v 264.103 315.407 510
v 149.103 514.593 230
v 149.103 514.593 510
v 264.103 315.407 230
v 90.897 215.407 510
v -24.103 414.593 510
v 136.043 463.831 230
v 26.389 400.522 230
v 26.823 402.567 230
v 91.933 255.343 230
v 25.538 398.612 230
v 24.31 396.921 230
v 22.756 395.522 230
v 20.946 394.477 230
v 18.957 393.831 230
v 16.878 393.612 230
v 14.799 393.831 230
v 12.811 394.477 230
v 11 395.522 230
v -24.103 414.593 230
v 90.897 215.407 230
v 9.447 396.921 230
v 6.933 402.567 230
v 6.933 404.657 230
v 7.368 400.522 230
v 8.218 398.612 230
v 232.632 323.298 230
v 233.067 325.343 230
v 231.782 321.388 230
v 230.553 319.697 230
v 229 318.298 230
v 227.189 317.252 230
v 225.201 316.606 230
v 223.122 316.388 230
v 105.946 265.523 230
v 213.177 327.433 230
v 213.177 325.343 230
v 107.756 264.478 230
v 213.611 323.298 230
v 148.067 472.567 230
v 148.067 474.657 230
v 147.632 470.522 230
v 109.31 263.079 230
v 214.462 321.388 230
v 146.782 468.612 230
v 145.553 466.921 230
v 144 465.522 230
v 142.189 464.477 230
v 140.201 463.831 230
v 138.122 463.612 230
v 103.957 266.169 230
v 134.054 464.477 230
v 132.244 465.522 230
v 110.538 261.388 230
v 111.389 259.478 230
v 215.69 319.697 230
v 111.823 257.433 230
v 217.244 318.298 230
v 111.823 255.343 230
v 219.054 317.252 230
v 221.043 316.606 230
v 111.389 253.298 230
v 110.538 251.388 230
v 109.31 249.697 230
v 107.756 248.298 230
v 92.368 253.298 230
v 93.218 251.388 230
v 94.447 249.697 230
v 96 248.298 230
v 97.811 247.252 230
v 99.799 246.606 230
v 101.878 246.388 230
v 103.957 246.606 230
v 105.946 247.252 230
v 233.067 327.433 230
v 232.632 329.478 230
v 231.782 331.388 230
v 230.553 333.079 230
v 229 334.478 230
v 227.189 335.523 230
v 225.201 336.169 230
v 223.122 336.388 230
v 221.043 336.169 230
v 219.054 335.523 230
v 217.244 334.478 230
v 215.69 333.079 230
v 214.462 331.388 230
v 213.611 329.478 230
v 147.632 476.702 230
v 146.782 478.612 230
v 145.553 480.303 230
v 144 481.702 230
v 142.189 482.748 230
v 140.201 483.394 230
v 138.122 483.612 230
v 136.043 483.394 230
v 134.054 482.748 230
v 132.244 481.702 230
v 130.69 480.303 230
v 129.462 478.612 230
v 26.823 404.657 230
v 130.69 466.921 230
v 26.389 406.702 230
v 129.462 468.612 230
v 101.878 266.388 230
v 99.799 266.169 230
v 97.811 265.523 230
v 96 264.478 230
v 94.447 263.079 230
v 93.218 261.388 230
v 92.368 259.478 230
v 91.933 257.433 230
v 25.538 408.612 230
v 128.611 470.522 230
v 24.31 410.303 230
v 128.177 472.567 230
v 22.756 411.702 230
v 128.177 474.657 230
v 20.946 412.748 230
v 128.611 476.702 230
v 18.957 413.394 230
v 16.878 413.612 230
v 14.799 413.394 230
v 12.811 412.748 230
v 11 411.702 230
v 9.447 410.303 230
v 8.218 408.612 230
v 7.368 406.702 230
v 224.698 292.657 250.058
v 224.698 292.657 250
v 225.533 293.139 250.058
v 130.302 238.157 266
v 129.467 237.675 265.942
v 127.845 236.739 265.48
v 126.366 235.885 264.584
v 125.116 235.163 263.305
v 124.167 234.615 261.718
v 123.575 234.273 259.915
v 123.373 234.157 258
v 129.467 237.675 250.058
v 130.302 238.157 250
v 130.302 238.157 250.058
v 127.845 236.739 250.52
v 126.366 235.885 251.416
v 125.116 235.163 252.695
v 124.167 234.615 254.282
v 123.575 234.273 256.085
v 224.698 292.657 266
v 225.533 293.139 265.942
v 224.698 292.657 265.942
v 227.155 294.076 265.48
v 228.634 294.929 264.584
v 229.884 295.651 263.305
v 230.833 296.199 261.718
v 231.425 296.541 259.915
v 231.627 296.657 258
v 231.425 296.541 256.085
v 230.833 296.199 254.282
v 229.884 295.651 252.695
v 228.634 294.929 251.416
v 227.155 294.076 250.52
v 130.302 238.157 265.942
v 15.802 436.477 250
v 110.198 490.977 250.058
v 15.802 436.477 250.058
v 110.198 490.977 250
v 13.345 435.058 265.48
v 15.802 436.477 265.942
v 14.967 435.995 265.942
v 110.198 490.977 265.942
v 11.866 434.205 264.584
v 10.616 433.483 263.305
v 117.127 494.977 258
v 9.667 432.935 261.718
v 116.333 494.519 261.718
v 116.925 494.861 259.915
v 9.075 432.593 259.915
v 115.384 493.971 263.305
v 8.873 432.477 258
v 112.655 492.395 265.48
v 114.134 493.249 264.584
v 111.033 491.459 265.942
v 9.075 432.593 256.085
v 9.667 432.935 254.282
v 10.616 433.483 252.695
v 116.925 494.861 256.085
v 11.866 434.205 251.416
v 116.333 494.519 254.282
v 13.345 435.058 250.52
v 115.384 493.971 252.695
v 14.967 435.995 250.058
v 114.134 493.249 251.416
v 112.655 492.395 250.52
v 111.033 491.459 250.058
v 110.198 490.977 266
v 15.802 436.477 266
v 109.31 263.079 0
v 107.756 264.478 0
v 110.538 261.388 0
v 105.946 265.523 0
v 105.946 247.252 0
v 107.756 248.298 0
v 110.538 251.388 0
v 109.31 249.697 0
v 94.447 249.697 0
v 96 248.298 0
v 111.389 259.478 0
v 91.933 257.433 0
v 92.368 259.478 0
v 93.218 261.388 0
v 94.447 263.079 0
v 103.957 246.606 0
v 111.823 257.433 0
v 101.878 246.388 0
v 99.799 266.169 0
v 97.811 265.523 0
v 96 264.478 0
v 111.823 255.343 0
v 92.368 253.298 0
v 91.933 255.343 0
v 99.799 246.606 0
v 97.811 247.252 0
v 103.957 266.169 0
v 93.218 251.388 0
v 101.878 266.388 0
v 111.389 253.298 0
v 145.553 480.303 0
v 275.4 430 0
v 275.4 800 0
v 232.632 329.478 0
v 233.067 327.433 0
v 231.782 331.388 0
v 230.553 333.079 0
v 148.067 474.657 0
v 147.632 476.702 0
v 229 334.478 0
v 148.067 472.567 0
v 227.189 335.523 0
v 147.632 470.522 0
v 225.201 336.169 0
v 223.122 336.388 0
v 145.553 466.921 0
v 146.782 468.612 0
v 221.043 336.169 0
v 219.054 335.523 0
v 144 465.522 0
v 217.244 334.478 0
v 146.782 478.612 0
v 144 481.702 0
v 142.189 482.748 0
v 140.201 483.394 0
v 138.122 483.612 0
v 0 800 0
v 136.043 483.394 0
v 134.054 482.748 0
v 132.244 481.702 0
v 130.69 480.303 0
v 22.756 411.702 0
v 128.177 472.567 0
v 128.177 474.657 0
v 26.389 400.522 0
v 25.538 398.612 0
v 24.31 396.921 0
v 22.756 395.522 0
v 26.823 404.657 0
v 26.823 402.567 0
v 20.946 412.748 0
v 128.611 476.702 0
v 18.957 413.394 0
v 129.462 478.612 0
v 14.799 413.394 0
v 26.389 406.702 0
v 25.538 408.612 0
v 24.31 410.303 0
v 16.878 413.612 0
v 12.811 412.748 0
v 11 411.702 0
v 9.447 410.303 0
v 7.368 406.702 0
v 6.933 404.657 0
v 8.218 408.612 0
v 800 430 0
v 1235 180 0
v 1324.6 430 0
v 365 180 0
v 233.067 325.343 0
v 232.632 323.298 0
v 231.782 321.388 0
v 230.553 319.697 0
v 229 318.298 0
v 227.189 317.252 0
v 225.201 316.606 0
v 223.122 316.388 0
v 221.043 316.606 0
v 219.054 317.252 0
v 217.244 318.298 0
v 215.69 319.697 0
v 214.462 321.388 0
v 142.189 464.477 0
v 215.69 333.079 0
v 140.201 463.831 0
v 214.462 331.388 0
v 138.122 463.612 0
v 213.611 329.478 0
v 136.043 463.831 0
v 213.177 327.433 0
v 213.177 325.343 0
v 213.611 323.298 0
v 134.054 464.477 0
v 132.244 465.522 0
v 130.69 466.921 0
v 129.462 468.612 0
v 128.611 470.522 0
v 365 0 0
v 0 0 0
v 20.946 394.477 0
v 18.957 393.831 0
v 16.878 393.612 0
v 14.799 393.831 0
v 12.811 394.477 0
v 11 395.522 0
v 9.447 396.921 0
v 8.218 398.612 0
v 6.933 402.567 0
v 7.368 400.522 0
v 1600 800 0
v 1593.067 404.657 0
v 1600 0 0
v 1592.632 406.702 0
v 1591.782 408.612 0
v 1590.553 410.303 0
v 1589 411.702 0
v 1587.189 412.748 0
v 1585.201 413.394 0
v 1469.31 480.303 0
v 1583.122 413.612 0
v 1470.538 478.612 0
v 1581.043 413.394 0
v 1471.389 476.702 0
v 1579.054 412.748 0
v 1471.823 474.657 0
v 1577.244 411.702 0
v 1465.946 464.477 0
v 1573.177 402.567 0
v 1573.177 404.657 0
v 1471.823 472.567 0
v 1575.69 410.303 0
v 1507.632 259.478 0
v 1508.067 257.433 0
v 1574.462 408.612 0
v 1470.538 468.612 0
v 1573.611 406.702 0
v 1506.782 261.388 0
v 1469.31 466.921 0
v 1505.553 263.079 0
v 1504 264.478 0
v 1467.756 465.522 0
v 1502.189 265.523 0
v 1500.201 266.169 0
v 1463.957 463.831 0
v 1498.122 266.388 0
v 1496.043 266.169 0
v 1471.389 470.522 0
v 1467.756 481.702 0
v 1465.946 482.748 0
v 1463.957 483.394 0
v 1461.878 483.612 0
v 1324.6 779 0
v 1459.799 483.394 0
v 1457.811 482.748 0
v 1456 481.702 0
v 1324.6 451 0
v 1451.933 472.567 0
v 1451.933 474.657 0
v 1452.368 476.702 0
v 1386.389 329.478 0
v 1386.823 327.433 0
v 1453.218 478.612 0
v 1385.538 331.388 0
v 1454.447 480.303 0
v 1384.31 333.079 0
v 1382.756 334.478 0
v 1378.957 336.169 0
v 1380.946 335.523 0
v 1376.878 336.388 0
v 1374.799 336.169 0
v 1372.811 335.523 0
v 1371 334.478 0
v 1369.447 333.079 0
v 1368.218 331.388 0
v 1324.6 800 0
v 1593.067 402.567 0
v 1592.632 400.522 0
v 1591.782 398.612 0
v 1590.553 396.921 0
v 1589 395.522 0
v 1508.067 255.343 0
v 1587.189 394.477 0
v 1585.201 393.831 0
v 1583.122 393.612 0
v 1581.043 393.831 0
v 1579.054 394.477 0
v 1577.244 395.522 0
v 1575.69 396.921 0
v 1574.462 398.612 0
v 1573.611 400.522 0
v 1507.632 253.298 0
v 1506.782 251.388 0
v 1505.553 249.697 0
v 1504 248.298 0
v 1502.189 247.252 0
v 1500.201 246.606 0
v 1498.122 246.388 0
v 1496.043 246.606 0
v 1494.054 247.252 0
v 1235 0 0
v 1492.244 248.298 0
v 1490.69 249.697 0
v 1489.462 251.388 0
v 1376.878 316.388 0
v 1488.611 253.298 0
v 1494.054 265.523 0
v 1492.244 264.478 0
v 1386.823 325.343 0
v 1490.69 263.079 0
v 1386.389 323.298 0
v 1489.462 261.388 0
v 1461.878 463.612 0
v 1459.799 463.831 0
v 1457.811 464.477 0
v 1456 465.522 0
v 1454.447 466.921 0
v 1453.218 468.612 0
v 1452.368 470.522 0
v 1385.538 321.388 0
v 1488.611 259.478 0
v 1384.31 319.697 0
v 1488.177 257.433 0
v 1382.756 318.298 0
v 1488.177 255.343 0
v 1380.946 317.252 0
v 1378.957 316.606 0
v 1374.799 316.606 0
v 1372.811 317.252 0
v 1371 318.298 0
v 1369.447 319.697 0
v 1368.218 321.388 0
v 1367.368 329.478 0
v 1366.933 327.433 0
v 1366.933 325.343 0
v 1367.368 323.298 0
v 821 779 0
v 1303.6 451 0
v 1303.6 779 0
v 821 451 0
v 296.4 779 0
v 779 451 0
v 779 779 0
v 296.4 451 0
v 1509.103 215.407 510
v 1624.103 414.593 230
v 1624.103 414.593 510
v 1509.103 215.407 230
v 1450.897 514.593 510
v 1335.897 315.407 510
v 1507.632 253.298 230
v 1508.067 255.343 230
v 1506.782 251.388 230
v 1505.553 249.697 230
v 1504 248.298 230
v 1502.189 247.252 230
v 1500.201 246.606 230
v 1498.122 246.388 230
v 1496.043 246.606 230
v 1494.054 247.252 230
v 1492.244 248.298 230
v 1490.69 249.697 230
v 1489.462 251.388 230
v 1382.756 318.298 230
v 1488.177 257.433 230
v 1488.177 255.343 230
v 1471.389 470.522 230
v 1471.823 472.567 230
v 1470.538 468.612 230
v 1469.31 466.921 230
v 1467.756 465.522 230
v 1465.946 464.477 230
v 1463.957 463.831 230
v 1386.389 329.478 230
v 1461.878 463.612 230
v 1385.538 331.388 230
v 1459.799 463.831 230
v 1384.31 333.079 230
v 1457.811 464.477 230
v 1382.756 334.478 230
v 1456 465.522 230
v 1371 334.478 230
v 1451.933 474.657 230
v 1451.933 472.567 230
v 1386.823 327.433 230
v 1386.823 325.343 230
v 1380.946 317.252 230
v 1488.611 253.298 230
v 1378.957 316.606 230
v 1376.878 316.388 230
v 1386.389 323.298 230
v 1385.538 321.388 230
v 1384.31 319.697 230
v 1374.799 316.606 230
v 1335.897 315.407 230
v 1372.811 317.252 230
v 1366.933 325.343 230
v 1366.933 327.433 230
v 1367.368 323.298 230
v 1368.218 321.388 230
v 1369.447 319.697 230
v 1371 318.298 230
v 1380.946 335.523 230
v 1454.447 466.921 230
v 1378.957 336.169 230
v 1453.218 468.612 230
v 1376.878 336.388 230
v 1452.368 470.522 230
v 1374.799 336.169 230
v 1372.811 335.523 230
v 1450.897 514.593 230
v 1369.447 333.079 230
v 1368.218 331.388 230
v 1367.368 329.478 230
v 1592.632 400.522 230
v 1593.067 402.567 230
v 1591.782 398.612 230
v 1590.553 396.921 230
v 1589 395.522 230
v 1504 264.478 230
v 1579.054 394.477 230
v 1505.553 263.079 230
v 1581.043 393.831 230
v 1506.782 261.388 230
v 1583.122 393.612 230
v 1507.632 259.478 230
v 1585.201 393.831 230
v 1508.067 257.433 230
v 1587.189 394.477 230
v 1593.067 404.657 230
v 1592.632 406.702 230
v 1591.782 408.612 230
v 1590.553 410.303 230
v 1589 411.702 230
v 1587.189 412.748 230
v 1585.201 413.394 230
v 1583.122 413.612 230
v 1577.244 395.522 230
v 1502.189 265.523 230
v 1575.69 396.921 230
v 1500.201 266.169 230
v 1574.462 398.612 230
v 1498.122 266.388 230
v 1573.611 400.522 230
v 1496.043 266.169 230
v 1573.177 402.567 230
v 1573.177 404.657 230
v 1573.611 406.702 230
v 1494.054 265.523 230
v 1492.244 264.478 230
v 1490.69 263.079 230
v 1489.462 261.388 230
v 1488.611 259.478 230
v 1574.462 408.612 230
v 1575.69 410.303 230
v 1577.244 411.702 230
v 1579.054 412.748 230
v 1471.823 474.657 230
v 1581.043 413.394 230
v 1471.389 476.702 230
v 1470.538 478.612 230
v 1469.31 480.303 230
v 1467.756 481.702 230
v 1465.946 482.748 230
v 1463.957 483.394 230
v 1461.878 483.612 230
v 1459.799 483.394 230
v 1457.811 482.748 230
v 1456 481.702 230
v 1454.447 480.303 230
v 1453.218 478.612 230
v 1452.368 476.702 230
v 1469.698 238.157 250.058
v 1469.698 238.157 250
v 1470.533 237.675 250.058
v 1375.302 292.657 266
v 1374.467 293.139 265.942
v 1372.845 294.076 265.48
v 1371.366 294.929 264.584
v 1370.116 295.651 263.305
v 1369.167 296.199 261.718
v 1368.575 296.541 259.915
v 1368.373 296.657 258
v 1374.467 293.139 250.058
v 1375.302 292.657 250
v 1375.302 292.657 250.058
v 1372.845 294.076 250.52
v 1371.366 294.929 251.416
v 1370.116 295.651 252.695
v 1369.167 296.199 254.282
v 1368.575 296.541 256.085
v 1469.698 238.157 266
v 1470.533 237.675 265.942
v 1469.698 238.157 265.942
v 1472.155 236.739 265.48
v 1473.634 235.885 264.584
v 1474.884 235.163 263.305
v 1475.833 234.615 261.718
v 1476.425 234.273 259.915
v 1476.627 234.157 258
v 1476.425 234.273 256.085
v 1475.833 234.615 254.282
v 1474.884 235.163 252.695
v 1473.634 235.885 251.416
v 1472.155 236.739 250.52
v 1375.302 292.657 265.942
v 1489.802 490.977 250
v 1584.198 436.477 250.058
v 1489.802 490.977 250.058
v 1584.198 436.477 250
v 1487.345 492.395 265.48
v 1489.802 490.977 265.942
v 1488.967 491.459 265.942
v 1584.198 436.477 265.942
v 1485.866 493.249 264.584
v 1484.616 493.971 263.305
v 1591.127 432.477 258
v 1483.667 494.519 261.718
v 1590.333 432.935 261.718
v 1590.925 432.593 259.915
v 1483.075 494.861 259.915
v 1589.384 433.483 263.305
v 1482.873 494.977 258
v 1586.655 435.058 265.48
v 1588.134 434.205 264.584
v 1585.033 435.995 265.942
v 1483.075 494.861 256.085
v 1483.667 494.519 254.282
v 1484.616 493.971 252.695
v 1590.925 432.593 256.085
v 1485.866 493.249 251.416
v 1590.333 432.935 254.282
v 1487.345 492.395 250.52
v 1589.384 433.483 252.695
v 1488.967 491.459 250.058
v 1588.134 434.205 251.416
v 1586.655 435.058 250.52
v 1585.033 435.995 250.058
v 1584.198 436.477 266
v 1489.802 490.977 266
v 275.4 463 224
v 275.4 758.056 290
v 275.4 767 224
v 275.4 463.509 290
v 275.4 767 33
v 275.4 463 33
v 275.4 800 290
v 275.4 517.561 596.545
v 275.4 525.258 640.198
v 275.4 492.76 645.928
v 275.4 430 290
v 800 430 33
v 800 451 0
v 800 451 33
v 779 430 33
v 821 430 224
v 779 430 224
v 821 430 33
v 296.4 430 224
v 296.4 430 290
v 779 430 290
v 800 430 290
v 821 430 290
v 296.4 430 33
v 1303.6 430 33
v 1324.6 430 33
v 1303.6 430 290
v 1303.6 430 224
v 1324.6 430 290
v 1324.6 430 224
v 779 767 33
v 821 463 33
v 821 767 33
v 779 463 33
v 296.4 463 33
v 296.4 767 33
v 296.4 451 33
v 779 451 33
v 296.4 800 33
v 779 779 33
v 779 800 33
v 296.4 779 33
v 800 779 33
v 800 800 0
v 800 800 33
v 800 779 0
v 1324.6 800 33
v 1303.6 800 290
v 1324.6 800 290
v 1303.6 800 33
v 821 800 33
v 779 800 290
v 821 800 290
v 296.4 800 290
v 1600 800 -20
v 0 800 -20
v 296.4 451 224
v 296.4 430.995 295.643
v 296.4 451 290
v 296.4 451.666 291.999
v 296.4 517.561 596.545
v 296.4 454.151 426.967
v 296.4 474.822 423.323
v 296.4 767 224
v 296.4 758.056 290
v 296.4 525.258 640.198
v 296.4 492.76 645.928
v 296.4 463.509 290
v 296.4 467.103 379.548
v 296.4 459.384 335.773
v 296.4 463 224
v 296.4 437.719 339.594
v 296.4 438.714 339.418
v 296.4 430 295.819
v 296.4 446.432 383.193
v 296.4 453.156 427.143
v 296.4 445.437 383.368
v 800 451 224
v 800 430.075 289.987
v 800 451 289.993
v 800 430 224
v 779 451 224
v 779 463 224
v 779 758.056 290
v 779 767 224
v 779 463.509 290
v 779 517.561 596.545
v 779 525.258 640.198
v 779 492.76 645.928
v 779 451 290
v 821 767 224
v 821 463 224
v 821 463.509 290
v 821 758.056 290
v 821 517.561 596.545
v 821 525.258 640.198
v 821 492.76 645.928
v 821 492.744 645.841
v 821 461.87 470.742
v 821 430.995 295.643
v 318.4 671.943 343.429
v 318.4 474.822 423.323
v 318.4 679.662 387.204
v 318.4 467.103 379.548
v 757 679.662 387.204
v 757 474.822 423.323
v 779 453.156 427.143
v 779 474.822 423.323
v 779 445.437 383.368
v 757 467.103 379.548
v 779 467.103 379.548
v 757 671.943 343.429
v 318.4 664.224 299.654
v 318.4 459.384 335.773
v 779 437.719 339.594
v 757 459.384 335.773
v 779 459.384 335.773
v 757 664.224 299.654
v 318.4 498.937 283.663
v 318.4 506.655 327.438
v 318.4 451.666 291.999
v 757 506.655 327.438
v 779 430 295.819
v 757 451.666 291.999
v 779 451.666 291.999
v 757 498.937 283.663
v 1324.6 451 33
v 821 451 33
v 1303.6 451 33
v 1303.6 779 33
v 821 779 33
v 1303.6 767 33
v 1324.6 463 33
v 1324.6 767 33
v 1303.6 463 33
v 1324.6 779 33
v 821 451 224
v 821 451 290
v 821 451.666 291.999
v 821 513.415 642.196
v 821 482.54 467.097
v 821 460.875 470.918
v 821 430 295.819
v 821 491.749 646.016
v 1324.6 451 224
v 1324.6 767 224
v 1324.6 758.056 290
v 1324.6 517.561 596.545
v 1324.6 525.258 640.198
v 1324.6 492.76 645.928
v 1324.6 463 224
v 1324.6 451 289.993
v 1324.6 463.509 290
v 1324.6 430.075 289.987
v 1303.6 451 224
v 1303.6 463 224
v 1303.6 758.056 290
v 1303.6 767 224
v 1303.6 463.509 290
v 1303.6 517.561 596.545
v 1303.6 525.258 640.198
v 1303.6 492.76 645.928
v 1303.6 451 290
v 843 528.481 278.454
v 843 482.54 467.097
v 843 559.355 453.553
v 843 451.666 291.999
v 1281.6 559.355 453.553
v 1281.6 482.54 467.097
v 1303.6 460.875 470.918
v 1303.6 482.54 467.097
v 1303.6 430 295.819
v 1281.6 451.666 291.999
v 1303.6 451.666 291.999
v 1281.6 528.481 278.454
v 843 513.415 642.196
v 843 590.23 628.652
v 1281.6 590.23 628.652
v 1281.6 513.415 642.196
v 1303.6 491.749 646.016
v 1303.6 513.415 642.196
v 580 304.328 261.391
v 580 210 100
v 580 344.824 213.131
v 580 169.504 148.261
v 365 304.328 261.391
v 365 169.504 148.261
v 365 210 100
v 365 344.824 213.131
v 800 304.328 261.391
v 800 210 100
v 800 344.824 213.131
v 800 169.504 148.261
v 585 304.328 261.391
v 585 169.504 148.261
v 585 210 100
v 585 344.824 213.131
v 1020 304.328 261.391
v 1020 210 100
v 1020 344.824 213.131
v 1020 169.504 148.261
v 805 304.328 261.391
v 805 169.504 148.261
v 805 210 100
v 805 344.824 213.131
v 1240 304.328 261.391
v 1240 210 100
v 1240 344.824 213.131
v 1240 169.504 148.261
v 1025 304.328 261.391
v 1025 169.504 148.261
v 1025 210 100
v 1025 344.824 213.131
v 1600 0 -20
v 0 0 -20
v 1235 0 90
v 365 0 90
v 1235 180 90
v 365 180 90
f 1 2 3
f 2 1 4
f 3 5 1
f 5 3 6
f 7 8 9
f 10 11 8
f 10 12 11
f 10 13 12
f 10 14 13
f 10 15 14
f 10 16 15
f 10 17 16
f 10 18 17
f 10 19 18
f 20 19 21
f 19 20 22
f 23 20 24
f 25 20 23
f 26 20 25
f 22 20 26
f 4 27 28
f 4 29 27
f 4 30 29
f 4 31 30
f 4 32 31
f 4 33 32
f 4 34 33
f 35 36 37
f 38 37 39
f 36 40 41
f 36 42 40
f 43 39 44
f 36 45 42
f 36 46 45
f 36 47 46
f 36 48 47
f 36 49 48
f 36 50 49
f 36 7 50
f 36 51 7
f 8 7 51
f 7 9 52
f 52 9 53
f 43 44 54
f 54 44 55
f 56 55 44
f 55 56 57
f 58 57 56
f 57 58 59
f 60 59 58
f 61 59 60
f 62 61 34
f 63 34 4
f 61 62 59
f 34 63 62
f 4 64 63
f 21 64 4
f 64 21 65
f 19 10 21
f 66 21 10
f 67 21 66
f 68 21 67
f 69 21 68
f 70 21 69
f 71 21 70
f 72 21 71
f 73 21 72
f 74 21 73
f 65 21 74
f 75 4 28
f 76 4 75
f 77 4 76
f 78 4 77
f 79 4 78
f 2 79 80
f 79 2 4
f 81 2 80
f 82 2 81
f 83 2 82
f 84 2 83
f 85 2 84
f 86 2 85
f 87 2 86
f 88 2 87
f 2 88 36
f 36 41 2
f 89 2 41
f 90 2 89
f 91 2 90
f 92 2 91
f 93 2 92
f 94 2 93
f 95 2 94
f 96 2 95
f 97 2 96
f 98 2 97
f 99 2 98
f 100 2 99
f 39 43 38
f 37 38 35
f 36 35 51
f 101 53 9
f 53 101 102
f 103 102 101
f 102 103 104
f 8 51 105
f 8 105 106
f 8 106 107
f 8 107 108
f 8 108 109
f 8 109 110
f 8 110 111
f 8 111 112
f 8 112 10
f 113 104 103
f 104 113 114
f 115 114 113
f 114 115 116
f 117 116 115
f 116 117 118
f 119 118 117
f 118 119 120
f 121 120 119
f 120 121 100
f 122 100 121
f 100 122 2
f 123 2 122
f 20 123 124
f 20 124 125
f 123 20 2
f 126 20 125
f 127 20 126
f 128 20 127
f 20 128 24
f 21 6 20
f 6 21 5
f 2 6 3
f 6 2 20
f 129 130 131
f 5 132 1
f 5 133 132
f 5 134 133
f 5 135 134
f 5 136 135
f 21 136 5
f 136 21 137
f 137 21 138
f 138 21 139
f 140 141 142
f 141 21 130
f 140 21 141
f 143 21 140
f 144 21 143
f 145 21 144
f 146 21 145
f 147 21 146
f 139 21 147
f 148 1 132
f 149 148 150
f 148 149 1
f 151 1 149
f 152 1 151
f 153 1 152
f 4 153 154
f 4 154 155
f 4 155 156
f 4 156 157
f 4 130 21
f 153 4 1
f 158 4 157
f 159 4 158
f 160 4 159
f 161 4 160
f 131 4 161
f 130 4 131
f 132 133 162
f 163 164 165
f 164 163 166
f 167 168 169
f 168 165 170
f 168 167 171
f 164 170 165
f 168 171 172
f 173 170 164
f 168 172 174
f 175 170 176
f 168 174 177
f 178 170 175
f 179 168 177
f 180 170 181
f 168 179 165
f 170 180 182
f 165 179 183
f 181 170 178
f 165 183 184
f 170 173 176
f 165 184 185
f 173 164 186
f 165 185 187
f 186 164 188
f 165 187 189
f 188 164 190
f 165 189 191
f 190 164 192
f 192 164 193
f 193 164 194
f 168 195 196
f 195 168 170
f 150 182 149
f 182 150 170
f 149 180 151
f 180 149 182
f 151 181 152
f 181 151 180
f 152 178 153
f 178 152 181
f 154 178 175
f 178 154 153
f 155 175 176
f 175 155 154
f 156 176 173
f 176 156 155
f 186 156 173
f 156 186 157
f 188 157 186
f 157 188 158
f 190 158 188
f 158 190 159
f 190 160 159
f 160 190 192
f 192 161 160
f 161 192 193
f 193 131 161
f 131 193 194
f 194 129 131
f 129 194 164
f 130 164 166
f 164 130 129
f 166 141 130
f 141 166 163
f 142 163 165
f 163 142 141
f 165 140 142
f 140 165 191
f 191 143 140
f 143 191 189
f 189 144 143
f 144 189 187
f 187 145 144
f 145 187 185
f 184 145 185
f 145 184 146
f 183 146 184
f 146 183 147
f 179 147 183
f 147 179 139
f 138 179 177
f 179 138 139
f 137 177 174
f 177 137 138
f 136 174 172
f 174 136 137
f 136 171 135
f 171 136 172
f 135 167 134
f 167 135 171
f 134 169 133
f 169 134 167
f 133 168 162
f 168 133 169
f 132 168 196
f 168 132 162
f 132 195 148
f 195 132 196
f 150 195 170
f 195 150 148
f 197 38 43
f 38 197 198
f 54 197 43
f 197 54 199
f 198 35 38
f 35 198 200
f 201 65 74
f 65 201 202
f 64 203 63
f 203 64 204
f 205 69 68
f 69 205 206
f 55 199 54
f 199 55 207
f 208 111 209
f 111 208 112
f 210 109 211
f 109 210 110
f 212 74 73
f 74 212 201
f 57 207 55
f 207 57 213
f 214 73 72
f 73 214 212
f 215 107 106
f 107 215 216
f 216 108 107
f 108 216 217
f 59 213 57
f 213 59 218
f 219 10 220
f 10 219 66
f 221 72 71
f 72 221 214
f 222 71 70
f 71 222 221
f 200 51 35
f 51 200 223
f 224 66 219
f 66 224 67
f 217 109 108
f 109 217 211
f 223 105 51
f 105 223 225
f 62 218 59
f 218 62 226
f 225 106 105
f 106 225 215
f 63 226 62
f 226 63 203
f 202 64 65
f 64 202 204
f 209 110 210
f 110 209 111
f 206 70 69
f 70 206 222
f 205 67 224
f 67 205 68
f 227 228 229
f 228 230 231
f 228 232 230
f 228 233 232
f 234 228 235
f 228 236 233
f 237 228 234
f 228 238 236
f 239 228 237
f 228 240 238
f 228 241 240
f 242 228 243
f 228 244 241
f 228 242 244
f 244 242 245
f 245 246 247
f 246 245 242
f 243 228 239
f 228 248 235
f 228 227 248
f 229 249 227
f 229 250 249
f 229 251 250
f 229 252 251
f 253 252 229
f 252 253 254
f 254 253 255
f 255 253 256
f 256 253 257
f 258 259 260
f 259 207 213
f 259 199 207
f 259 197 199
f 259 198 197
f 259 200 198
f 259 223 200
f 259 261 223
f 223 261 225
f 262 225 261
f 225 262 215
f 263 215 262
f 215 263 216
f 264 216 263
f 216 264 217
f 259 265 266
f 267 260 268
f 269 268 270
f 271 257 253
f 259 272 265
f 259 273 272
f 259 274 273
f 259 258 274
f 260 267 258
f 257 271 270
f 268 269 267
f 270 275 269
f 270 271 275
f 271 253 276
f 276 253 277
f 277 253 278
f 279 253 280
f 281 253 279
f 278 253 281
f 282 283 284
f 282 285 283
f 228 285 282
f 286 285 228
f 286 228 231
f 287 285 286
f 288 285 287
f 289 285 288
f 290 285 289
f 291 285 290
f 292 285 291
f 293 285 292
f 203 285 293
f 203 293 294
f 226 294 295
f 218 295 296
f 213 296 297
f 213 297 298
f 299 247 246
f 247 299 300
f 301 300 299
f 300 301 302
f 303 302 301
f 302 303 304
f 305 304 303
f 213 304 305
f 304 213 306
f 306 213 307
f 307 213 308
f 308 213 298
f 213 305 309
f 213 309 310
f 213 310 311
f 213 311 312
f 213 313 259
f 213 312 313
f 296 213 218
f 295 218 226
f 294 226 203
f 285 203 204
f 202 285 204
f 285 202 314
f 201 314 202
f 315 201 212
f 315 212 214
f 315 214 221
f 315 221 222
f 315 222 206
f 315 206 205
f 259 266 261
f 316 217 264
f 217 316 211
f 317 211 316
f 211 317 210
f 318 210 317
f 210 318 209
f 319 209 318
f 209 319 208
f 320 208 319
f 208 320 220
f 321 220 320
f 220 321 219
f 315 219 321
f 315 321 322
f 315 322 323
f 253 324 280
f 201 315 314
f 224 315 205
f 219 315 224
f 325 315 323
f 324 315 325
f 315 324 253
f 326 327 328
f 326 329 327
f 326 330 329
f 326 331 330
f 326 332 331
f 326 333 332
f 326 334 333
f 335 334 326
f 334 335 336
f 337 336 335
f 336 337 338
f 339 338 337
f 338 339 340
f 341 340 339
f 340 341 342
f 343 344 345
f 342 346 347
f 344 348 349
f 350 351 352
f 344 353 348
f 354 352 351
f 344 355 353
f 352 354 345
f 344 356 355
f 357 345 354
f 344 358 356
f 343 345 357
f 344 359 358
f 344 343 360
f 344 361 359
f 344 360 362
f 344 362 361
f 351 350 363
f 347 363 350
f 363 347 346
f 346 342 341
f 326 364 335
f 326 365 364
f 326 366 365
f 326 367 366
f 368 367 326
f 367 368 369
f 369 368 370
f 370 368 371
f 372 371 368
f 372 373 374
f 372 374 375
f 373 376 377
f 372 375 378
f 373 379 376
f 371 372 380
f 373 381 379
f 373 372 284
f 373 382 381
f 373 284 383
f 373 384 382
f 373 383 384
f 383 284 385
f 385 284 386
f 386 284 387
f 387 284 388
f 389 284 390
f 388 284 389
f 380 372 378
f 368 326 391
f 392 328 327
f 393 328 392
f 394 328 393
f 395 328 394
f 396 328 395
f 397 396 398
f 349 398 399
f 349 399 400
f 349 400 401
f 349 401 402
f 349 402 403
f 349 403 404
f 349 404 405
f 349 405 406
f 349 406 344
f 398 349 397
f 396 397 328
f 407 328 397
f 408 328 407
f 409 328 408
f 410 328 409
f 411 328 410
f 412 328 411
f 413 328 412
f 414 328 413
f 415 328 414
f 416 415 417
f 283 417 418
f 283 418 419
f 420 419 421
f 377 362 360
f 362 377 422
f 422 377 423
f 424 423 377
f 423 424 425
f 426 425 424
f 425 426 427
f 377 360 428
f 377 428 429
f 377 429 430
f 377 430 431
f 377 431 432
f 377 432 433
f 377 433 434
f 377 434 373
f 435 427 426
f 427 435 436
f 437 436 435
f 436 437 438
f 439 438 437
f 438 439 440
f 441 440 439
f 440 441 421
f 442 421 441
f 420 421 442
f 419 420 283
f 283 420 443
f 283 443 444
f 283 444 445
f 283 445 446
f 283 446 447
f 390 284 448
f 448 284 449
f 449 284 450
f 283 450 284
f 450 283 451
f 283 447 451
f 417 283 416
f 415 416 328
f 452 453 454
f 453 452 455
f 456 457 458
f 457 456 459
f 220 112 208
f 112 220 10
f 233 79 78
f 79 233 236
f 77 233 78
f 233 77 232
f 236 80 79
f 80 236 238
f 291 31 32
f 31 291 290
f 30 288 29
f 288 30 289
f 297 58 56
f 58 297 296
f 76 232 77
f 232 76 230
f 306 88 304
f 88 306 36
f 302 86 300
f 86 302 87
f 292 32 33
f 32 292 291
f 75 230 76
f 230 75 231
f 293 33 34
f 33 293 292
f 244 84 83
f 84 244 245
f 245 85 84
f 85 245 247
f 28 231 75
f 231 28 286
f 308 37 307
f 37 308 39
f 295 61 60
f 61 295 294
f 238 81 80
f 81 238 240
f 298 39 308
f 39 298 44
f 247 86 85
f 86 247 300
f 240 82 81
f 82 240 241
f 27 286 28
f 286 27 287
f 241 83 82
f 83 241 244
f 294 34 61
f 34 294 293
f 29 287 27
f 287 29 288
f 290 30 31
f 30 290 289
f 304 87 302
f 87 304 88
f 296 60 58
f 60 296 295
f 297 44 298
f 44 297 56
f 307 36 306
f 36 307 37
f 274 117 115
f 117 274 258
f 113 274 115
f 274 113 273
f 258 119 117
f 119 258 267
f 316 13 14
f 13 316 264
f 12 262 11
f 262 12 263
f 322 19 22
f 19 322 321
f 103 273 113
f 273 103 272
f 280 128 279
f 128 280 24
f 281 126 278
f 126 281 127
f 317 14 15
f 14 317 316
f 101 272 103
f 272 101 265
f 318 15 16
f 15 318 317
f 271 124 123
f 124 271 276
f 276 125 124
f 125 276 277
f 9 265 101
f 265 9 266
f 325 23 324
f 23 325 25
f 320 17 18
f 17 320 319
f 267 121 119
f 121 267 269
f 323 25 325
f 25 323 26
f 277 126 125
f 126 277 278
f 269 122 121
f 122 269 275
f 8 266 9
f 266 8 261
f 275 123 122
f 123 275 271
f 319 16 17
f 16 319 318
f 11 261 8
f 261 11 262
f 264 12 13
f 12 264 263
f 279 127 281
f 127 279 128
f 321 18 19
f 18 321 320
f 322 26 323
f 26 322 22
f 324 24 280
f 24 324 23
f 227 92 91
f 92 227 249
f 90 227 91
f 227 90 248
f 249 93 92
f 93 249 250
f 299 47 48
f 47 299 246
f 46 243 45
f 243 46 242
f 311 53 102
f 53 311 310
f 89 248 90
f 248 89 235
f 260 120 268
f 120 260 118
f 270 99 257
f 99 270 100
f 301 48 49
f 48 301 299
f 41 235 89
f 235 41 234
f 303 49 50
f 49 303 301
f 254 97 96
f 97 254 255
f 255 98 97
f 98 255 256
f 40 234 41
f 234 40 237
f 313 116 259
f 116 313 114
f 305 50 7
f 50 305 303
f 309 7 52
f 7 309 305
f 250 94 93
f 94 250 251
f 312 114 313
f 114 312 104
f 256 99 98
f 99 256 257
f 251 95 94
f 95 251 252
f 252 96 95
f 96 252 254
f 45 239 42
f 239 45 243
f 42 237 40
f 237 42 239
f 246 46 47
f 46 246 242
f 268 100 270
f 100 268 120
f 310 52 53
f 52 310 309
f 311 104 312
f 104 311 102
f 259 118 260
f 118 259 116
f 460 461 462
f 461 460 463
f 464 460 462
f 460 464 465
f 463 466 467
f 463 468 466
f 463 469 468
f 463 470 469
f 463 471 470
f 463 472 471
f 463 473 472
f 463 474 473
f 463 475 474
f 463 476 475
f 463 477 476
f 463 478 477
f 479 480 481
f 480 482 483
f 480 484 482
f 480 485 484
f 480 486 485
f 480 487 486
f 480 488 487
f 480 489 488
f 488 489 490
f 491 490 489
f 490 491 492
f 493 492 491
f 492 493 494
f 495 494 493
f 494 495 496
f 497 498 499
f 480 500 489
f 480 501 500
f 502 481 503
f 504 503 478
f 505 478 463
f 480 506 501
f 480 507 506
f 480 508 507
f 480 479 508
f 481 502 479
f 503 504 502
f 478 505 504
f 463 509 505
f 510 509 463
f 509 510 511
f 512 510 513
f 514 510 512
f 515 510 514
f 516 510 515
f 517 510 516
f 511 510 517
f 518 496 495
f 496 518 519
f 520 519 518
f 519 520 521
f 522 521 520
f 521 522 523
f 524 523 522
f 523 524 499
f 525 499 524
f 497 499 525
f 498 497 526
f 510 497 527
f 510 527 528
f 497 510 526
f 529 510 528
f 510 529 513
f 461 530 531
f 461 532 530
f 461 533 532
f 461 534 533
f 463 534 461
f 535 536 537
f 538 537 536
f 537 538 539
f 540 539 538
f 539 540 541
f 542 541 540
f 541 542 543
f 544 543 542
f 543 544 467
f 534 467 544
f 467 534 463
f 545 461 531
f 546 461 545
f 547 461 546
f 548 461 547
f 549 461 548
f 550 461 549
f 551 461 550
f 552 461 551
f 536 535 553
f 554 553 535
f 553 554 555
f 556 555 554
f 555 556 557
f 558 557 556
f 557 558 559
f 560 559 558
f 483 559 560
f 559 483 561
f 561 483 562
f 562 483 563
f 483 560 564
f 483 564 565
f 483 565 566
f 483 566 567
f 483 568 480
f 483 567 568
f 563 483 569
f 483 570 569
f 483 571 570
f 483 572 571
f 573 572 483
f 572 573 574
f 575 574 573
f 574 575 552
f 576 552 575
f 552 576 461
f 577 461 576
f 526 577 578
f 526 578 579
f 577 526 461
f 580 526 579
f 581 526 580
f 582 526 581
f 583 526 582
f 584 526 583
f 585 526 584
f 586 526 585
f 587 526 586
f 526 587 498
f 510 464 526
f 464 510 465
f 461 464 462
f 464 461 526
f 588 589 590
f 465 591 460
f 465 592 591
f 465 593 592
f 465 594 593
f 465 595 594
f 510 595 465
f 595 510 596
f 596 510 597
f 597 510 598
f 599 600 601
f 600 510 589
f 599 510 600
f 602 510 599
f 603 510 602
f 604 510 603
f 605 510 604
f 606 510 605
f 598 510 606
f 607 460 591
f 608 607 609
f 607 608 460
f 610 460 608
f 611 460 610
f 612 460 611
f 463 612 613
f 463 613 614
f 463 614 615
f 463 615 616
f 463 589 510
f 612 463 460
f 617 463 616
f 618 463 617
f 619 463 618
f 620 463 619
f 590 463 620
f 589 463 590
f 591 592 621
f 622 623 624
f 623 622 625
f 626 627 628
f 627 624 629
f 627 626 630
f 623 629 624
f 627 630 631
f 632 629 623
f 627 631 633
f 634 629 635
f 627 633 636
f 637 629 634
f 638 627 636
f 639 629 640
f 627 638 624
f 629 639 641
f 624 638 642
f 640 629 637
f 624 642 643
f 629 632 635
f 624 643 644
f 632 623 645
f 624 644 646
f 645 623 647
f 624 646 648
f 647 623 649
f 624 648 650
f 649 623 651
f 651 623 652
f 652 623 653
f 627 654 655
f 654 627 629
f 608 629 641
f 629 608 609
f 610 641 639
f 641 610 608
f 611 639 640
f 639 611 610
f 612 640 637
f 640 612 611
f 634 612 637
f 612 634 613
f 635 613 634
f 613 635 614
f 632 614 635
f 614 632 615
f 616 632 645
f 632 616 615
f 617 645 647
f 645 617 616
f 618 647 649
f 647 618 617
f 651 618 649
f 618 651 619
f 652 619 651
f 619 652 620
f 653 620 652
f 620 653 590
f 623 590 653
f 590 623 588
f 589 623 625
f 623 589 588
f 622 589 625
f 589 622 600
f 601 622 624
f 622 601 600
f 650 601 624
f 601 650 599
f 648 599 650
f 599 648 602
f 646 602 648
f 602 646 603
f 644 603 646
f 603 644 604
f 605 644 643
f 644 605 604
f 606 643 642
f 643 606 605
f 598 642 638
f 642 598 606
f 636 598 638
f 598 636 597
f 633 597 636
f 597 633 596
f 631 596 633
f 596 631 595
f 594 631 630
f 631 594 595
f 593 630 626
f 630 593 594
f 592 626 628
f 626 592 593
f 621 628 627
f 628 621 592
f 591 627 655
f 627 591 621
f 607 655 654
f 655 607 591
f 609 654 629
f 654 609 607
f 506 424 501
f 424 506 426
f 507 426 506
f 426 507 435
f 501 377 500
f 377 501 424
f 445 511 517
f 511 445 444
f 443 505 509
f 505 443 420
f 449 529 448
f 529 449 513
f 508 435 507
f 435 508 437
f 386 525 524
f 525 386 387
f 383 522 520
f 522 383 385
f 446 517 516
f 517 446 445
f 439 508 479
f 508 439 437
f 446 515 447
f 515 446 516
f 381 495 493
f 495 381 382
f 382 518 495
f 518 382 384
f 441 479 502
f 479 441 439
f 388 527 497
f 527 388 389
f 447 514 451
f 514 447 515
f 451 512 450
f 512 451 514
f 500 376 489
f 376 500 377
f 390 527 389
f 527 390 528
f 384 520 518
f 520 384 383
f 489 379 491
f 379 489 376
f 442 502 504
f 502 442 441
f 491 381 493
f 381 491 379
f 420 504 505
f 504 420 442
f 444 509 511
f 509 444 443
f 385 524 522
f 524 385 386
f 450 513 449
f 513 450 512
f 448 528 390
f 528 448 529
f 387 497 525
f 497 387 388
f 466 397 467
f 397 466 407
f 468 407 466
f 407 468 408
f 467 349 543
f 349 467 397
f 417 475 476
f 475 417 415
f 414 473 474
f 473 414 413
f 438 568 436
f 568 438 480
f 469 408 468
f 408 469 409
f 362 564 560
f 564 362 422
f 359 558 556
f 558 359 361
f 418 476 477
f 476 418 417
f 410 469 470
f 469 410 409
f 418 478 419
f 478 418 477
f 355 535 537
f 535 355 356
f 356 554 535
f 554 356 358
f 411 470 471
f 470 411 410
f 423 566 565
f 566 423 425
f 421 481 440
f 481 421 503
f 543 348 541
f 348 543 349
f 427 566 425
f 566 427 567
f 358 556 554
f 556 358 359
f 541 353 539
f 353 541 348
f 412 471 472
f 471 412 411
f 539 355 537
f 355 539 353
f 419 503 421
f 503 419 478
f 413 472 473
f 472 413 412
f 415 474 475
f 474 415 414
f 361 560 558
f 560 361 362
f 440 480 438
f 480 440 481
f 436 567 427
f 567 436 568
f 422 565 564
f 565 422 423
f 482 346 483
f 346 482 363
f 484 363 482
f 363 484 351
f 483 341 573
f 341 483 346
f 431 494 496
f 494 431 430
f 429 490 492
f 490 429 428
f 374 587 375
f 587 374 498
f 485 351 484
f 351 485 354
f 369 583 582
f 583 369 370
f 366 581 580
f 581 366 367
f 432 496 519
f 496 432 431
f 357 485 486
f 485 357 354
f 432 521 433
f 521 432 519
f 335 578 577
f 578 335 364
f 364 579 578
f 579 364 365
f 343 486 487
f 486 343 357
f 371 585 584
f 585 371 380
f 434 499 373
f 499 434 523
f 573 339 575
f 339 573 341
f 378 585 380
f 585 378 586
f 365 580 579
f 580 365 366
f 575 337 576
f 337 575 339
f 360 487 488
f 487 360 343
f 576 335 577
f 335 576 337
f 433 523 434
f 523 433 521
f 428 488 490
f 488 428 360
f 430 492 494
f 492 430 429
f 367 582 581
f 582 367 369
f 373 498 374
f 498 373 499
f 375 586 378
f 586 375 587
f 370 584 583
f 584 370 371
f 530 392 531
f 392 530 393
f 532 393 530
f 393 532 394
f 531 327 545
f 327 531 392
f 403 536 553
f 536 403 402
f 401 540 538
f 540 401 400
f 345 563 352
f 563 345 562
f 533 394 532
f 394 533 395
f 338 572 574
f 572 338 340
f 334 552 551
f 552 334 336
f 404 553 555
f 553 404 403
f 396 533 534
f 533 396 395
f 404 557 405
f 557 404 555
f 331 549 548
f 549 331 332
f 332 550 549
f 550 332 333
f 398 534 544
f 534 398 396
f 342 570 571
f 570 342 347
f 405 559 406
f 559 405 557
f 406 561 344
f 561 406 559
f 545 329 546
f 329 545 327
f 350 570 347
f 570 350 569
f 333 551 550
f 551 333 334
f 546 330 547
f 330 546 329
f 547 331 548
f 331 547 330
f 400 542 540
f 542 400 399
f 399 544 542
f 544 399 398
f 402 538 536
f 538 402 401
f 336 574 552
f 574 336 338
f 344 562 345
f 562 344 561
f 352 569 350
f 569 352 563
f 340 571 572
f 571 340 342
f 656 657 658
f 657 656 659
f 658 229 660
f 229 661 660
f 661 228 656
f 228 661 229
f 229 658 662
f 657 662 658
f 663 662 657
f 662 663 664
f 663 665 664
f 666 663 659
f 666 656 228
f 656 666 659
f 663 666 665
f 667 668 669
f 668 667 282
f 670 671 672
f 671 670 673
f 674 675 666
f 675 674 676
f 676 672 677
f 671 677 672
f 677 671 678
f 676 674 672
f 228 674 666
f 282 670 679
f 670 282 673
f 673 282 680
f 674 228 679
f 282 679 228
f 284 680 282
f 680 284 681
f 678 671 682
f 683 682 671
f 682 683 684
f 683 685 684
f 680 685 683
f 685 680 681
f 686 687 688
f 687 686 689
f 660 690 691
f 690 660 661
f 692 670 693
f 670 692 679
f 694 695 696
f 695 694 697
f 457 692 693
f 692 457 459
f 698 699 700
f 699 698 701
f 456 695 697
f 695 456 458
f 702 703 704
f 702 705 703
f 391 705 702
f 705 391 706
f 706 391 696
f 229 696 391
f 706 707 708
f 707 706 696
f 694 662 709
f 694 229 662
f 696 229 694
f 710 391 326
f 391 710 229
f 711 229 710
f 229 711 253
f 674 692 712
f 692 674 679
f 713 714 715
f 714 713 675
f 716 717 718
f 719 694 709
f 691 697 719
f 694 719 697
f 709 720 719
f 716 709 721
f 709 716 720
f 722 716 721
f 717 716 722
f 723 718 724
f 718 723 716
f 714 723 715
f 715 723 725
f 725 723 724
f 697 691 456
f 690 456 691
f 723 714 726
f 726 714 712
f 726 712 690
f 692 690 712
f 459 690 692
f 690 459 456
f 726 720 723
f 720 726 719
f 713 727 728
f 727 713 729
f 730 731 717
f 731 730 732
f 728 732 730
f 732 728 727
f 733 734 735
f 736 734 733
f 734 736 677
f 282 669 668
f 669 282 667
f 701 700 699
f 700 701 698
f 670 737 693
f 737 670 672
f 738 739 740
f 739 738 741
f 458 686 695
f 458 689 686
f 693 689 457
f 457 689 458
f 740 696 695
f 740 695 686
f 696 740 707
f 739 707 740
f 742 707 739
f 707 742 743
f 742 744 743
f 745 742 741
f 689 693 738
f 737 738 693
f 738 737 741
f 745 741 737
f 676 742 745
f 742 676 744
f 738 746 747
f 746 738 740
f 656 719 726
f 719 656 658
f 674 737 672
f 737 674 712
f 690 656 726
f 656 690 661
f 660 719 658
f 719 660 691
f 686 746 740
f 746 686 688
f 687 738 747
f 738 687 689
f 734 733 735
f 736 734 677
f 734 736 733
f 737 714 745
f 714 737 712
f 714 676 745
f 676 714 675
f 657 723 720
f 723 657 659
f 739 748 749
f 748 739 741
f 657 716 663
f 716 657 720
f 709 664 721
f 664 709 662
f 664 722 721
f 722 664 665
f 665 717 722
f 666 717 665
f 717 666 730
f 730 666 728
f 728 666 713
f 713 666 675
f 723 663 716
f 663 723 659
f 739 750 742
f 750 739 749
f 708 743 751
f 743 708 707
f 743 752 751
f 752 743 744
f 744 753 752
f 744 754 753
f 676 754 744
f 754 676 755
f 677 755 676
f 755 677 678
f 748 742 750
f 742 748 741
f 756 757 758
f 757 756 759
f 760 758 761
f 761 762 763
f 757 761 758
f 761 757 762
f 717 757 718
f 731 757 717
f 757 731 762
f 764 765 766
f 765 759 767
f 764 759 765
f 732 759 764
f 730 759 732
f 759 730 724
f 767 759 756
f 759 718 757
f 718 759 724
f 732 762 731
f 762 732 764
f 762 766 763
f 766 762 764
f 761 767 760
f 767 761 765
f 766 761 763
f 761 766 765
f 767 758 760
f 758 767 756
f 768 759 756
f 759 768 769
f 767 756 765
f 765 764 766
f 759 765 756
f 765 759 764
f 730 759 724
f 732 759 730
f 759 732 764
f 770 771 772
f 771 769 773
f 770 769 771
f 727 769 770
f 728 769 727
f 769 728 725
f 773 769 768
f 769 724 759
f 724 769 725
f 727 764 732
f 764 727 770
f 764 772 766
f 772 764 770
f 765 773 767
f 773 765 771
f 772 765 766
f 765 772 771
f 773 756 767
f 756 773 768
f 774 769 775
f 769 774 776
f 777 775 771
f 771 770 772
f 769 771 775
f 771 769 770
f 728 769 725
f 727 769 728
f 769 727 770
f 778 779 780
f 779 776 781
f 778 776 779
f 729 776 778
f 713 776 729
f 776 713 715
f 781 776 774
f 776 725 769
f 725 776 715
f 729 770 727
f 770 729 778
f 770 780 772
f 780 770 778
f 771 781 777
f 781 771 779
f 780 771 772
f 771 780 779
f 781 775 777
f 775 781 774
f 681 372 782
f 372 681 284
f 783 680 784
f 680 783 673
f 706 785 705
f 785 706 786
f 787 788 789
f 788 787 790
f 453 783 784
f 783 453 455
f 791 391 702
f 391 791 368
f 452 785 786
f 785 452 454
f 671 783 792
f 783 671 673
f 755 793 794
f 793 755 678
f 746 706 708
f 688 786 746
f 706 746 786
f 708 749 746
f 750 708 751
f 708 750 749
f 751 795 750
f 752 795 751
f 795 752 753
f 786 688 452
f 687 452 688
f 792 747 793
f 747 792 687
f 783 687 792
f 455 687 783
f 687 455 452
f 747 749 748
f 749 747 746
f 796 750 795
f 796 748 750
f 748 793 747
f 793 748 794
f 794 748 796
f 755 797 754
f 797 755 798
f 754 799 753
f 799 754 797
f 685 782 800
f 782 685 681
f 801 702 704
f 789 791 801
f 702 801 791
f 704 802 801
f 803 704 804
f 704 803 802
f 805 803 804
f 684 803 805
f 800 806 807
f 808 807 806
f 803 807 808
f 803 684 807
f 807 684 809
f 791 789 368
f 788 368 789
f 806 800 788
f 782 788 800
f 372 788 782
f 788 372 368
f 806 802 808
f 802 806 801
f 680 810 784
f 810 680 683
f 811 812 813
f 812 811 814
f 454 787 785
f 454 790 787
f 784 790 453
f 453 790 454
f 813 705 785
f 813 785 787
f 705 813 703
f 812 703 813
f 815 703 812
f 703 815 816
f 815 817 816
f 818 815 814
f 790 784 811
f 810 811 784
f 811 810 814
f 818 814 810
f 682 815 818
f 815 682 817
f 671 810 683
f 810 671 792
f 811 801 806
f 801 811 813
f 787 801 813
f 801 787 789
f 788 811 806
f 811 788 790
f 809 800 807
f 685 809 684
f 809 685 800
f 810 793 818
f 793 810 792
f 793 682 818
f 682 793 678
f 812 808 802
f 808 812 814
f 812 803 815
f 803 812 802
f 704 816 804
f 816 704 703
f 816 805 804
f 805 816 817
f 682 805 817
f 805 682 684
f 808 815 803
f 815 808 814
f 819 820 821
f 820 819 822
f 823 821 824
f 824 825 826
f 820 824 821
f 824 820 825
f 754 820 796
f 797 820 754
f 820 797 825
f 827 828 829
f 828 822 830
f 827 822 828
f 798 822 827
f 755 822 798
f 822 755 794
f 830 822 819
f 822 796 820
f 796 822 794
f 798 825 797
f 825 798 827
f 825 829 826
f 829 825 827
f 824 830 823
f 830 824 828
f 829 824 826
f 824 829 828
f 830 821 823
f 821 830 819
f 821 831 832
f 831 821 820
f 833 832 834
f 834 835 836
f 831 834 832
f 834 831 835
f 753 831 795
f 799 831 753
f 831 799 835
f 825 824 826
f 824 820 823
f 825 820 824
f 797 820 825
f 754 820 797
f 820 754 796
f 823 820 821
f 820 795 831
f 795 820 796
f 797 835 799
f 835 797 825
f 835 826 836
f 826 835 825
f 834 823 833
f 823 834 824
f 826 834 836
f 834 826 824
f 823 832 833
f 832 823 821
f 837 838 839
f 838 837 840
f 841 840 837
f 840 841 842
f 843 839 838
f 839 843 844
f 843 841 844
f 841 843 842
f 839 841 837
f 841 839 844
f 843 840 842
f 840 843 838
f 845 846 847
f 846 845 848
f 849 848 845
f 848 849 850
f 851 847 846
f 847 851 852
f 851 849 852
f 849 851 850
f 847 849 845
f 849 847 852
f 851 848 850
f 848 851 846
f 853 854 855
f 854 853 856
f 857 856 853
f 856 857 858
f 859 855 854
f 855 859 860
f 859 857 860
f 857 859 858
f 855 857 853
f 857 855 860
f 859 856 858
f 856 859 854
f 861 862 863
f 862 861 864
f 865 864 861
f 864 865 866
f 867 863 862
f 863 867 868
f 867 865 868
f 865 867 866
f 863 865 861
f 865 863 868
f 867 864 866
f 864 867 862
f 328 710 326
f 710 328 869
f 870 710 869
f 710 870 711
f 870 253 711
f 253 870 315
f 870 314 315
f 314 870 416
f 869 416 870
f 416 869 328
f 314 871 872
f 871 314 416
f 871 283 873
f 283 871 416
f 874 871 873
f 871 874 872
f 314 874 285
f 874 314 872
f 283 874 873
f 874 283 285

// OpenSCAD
// file: modules/math.scad
function triangle_side_two_sides_angle(l1, l2, angle) =
    sqrt(pow(l1, 2) + pow(l2, 2) - 2 * l1 * l2 * cos(angle));

function triangle_A_from_all_sides(a, b, c) =
    acos((pow(b, 2) + pow(c, 2) - pow(a, 2)) / (2 * b * c));
// file: modules/rotate.scad
module rotate_about(a, pv) {
  translate(v = pv) rotate(a = a) translate(v = -pv) children();
}
// file: modules/rack.scad
use <beam.scad>
use <math.scad>
use <rotate.scad>

function rack_unit_width() = 482.6;
function rack_unit_height() = 44.45;

function unit_to_length(units) = units * rack_unit_height();
function start_at_unit(unit) = unit * rack_unit_height();

module rack_enclosure(units = 0, depth, tilt_angle, beam_long_side,
                      beam_short_side, spacing_from_surface,
                      frame_color) {
  outer_width = rack_unit_width() + 2 * beam_short_side;
  // when the tilting angle is greater than zero, additional space is
  // needed so that the rack ears can fit
  offset_due_tilt = beam_long_side * sin(tilt_angle) /
                      sin(90 - tilt_angle);

  module rack_beam(length, rotation = [ 0, 0, 0 ], a_start_short,
                   a_start_long, a_stop_short, a_stop_long, ) {
    rotate(rotation) beam(
        length = length, short_side = beam_short_side,
        long_side = beam_long_side, a_start_short = a_start_short,
        a_start_long = a_start_long, a_stop_short = a_stop_short,
        a_stop_long = a_stop_long);
  }

  module frame(rear_beam = false) {
    module frame_beam(length) {
      translate(v = [ 0, beam_short_side, 0 ]) rotate([ 90, 0, 0 ])
          rack_beam(length = length);
    }

    // front
    frame_beam(outer_width);

    if (rear_beam) {
      // rear
      translate(v = [ 0, depth - beam_short_side, 0 ])
          frame_beam(outer_width);
    }

    // left
    translate(v = [ beam_short_side, beam_short_side, 0 ])
        rotate([ 0, 0, 90 ])
            frame_beam(depth - (rear_beam ? 2 : 1) * beam_short_side);
    // right
    translate(v = [ outer_width, beam_short_side, 0 ])
        rotate([ 0, 0, 90 ])
            frame_beam(depth - (rear_beam ? 2 : 1) * beam_short_side);
  }

  module riser() {
    module legs() {
      module leg() {
        translate(v = [ beam_short_side, 0, 0 ]) rotate([ 0, -90, 0 ])
            rack_beam(length =
                          spacing_from_surface - 3 * beam_long_side);
      }

      // front left
      leg();
      // rear left
      translate(v = [ 0, depth - beam_long_side, 0 ]) leg();
      // rear right
      translate(v = [
        outer_width - beam_short_side, depth - beam_long_side, 0
      ]) leg();
      // front right
      translate(v = [ outer_width - beam_short_side, 0, 0 ]) leg();
    }

    frame(rear_beam = true);
    translate(v = [ 0, 0, beam_long_side ]) legs();
    translate(v = [ 0, 0, spacing_from_surface - 2 * beam_long_side ])
        frame();
  }

  module enclosure(front_tilt_angle) {
    frontal_beam_length = unit_to_length(units) + offset_due_tilt;

    module vertical_enclosure_beam(length, start_angle, stop_angle) {
      translate([ 0, beam_long_side, 0 ]) rotate([ 90, -90, 90 ])
          rack_beam(length = length, a_start_long = start_angle,
                    a_stop_long = stop_angle);
    }

    module frontal_beam() {
      translate(v = [ 0, 0, beam_long_side ])
          rotate(a = [ -front_tilt_angle, 0, 0 ])
              vertical_enclosure_beam(length = frontal_beam_length,
                                      start_angle = front_tilt_angle);
    }

    module rear_beam() {
      frontal_beam_inner_offset =
          beam_long_side * sin(tilt_angle) / sin(90 - tilt_angle);
      frontal_beam_inner_length =
          frontal_beam_length - frontal_beam_inner_offset;

      frame_inner_offset = beam_long_side / sin(90 - tilt_angle);
      frame_inner_length = depth - frame_inner_offset;

      length = triangle_side_two_sides_angle(
          frame_inner_length, frontal_beam_inner_length,
          90 - front_tilt_angle);

      angle = 90 - triangle_A_from_all_sides(
                       a = frontal_beam_inner_length, b = length,
                       c = frame_inner_length);

      translate([ 0, depth - beam_long_side, beam_long_side ])
          rotate_about(a = [ angle, 0, 0 ],
                       pv = [ 0, beam_long_side, 0 ])
              vertical_enclosure_beam(
                  length = length, start_angle = -angle,
                  stop_angle = 90 - front_tilt_angle - angle);
    }

    rear_beam();
    frontal_beam();
    translate(v = [ outer_width - beam_short_side, 0, 0 ]) {
      rear_beam();
      frontal_beam();
    }

    frame();
  }

  color(frame_color) {
    riser();
    translate(v = [ 0, 0, spacing_from_surface - beam_long_side ])
        enclosure(front_tilt_angle = tilt_angle);
  }

  translate(v = [ beam_short_side, 0, spacing_from_surface + offset_due_tilt ])
      rotate(a = [ -tilt_angle, 0, 0 ]) children();
}

module rack_instrument(units, depth, c, label) {
  height = unit_to_length(units);
  module instrument() {
    color("black") cube([ 22, 22, height ]);

    translate([ rack_unit_width() - 22, 0, 0 ]) color("black")
        cube([ 22, 22, height ]);

    color(c) translate([ 22, 0, 0 ])
        cube([ rack_unit_width() - 44, depth, height ]);
  }

  union() {
    instrument();

    if (label) {
      translate([ rack_unit_width() / 2, 0, height / 2 ])
          rotate([ 90, 0, 0 ])
              text(label, halign = "center", valign = "center");
    }
  }
}

rack_enclosure(units = 8, tilt_angle = 10, depth = 370,
               spacing_from_surface = 270, beam_long_side = 33,
               beam_short_side = 21, frame_color = "#9c4000") {
  for (i = [0:1:7]) {
    translate([ 0, 0, start_at_unit(i) ])
        rack_instrument(units = 1, depth = 200);
  }
}
// file: modules/presonus.scad
module rounded_frontal_bass_port(width, depth, radius) {
  linear_extrude(depth) union() {
    translate([ radius, radius, 0 ]) circle(r = radius);
    translate(v = [ radius, 0, 0 ])
        square([ width - radius * 2, radius * 2 ]);
    translate(v = [ width - radius, radius, 0 ]) circle(r = radius);
  }
}

function presonus_eris_e5xt_width() = 200;
function presonus_eris_e5xt_height() = 280;
function presonus_eris_e5xt_depth() = 230;

module presonus_eris_e5xt() {
  width = presonus_eris_e5xt_width();
  height = presonus_eris_e5xt_height();
  depth = presonus_eris_e5xt_depth();

  module enclosure() {
    difference() {
      bass_port_width = 125;
      bass_port_depth = depth;
      bass_port_radius = 8;
      cube([ width, depth, height ]);
      translate(v =
                    [
                      (width - bass_port_width) / 2, -1, 20 + 2 *
                      bass_port_radius
                    ]) rotate(a = [ -90, 0, 0 ]) color("black")
          rounded_frontal_bass_port(bass_port_width, bass_port_depth,
                                    bass_port_radius);
    }
  }

  union() {
    enclosure();
    translate([ width / 2, 0, height / 2 ]) rotate([ 90, 0, 0 ])
        color("white") text("PreSonus Eris E5 XT", halign = "center",
                            valign = "center");
  }
}

presonus_eris_e5xt();

module put_on_stand(height) {
  translate([ 0, 0, height ]) children();
  translate([ 30, 30, 0 ]) cylinder(h = height, r = 10);
  translate([ 200 - 30, 30, 0 ]) cylinder(h = height, r = 10);
  translate([ 30, 200, 0 ]) cylinder(h = height, r = 10);
  translate([ 200 - 30, 200, 0 ]) cylinder(h = height, r = 10);
}
// file: modules/elektron.scad
function digi_box_width() = 215;
function digi_box_height() = 176;
function digi_box_depth() = 63;

module digi(box_color, label) {
  width = digi_box_width();
  depth = digi_box_height();
  height = digi_box_depth();

  union() {
    color(box_color) cube([ width, depth, height ]);

    if (label) {
      translate([ width / 2, depth / 2, height ]) color("white")
          text(label, halign = "center", valign = "center");
    }
  }
}

module digitone() { digi("#4a919e", "Digitone"); }

module syntakt() { digi("#bf5258", "Syntakt"); }

module digitakt() { digi("#df9863", "Digitakt"); }

module analog_heat() { digi("#adb2b5", "Analog Heat"); }

function digitone_keys_width() = 870;
function digitone_keys_height() = 90;
function digitone_keys_depth() = 180;

module digitone_keys() {
  width = digitone_keys_width();
  height = digitone_keys_height();
  depth = digitone_keys_depth();

  union() {
    color("#4a919e") cube([ width, depth, height ]);
    translate([ width / 2, depth / 2, height ]) color("white")
        text("Digitone Keys", halign = "center", valign = "center");
  }
}

translate(v = [ 0, 220, 90 ]) rotate(a = [ 45, 0, 0 ]) {
  digitone();

  translate(v = [ 215 + 3.33, 0, 0 ]) digitakt();

  translate(v = [ 215 * 2 + 3.33 * 2, 0, 0 ]) analog_heat();

  translate(v = [ 215 * 3 + 3.33 * 3, 0, 0 ]) syntakt();
}

digitone_keys();
// file: modules/beam.scad
nothing = 0.01;

module beam(length, long_side, short_side, a_start_short,
            a_start_long, a_stop_short, a_stop_long) {
  difference() {
    cube([ length, long_side, short_side ]);

    /*
      make the ends angled by subtracting a triangle from them

         a        b        c
      ------ = ------ = ------
      sin(A)   sin(B)   sin(C)
              B
             /\
          c /  \ a
           /    \
        A /______\ C
              b

      two angles and a side is always known
      - the corner angle which is always 90
      - the angle parameter
      - the length of the side which is going to be angled
    */

    if (!is_undef(a_start_short)) {
      /*
        A angle is 90
        B angle is 90 - a_start_short
        C angle is a_start_short
        c side is short_side
        b side length is missing

        b = c * sin(C) / sin(B)
      */

      b_length =
          short_side * sin(a_start_short) / sin(90 - a_start_short);

      if (a_start_short > 0) {
        translate([ -nothing, long_side + nothing, -nothing ])
            rotate([ 90, 0, 0 ])
                linear_extrude(long_side + 2 * nothing)
                    polygon(points = [
                      [ -nothing, 0 ], [ 0, short_side - nothing ],
                      [ b_length + nothing, -nothing ]
                    ]);
      } else {
        translate([ -nothing, -nothing, short_side + nothing ])
            rotate([ -90, 0, 0 ])
                linear_extrude(long_side + 2 * nothing)
                    polygon(points = [
                      [ -nothing, short_side ],
                      [ -b_length, -nothing ], [ 0, -nothing ]
                    ]);
      }
    } else if (!is_undef(a_start_long)) {
      /*
        A angle is 90
        B angle is 90 - a_start_long
        C angle is a_start_long
        c side is long_side
        b side length is missing

        b = c * sin(C) / sin(B)
      */

      b_length =
          long_side * sin(a_start_long) / sin(90 - a_start_long);

      if (a_start_long > 0) {
        translate([ -nothing, -nothing, -nothing ])
            linear_extrude(short_side + 2 * nothing)
                polygon(points = [
                  [ -nothing, 0 ], [ 0, long_side - nothing ],
                  [ b_length + nothing, -nothing ]
                ]);
      } else {
        translate([ -nothing, 0, -nothing ])
            linear_extrude(short_side + 2 * nothing)
                polygon(points = [
                  [ -b_length, long_side + nothing ], [ 0, 0 ],
                  [ 0, long_side + nothing ]
                ]);
      }
    }

    if (!is_undef(a_stop_short)) {
      /*
        A angle is 90
        B angle is 90 - a_stop_short
        C angle is a_stop_short
        c side is short_side
        b side length is missing

        b = c * sin(C) / sin(B)
      */

      b_length =
          short_side * sin(a_stop_short) / sin(90 - a_stop_short);

      if (a_stop_short > 0) {
        translate([ 0, long_side + nothing, 0 ]) rotate([ 90, 0, 0 ])
            linear_extrude(long_side + 2 * nothing) polygon(
                points = [[length + nothing, 0],
                          [length + nothing, short_side + nothing],
                          [length - b_length + nothing,
                           short_side + nothing]]);
      } else {
        translate([ 0, long_side + nothing, -nothing ]) rotate(
            [ 90, 0, 0 ]) linear_extrude(long_side + 2 * nothing)
            polygon(points =
                        [[length + b_length, 0],
                         [length + nothing, 0],
                         [length + nothing, short_side + nothing]]);
      }
    } else if (!is_undef(a_stop_long)) {
      /*
        A angle is 90
        B angle is 90 - a_stop_long
        C angle is a_stop_long
        c side is long_side
        b side length is missing

        b = c * sin(C) / sin(B)
      */

      b_length = long_side * sin(a_stop_long) / sin(90 - a_stop_long);

      if (a_stop_long > 0) {
        translate([ 0, 0, -nothing ])
            linear_extrude(short_side + 2 * nothing) polygon(
                points = [[length - b_length, long_side + nothing],
                          [length + nothing, -nothing],
                          [length + nothing, long_side + nothing]]);
      } else {
        translate([ 0, 0, -nothing ])
            linear_extrude(short_side + 2 * nothing) polygon(
                points = [[length + b_length, -nothing],
                          [length + nothing, -nothing],
                          [length + nothing, long_side + nothing]]);
      }
    }
  }
}

beam(length = 100, long_side = 33, short_side = 22,
     a_start_short = 30, a_stop_short = 30);
// main file
use <modules/beam.scad>
use <modules/elektron.scad>
use <modules/presonus.scad>
use <modules/rack.scad>
use <modules/rotate.scad>

tabletop_width = 1600;
tabletop_depth = 800;
tabletop_height = 20;

frame_beam_long_side = 33;
frame_beam_short_side = 21;

rack_max_units = 8;
rack_tilt_angle = 10;
rack_depth = 370;

speaker_angle = 30;

rack_enclosure_width = rack_unit_width() + 2 * frame_beam_short_side;

module tabletop() {
  color("white") translate([ 0, 0, -tabletop_height ])
      cube([ tabletop_width, tabletop_depth, tabletop_height ]);
}

module speakers() {
  speaker_width = presonus_eris_e5xt_width();
  speaker_height = presonus_eris_e5xt_height();
  speaker_depth = presonus_eris_e5xt_depth();

  speaker_center =
      [ speaker_width / 2, speaker_depth / 2, speaker_height / 2 ];

  module speaker_on_stand() {
    put_on_stand(height = 230) presonus_eris_e5xt();
  }

  color("#525252") translate([ 20, 250, 0 ])
      rotate_about(a = speaker_angle, pv = speaker_center)
          speaker_on_stand();

  color("#525252")
      translate([ tabletop_width - speaker_width - 20, 250, 0 ])
          rotate_about(a = -speaker_angle, pv = speaker_center)
              speaker_on_stand();
}

module elektron_boxes() {
  spacing = 5;
  function x_offset(i) = i * (digi_box_width() + spacing);

  digitone();
  translate(v = [ x_offset(1), 0, 0 ]) syntakt();
  translate(v = [ x_offset(2), 0, 0 ]) digitakt();
  translate(v = [ x_offset(3), 0, 0 ]) analog_heat();
}

module rack_enclosures(spacing_from_surface) {
  translate(v = [ 0, tabletop_depth - rack_depth, 0 ]) {
    rack_enclosure(units = rack_max_units,
                   tilt_angle = rack_tilt_angle, depth = rack_depth,
                   spacing_from_surface = spacing_from_surface,
                   beam_long_side = frame_beam_long_side,
                   beam_short_side = frame_beam_short_side,
                   frame_color = "#9c4000") {
      translate([ 0, 0, start_at_unit(2) ]) rack_instrument(
          1, 230, "#900", "Focusrite Scarlett 18i20 MK3");
      translate([ 0, 0, start_at_unit(1) ]) rack_instrument(
          1, 230, "#900", "Focusrite Scarlett 18i20 MK3");

      rack_instrument(1, 70, "#232f59", "Samson S-patch plus");
    }

    translate([ rack_unit_width() + frame_beam_short_side * 2, 0, 0 ])
        rack_enclosure(units = rack_max_units,
                       tilt_angle = rack_tilt_angle,
                       depth = rack_depth,
                       spacing_from_surface = spacing_from_surface,
                       beam_long_side = frame_beam_long_side,
                       beam_short_side = frame_beam_short_side,
                       frame_color = "#9c4000") {
                       rack_instrument(4, 100, "#900", "Nord Rack 2");
                       translate([ 0, 0, start_at_unit(4) ])
      rack_instrument(4, 100, "#900", "Nord Lead A1R");
    }
  }
}

tabletop();
speakers();

translate([ (tabletop_width - 2 * rack_enclosure_width) / 2, 0, 0 ])
    rack_enclosures(290);

translate([
  (tabletop_width - 4 * digi_box_width() - 10) / 2, 210,
  digitone_keys_height() + 10
]) rotate(a = [ 40, 0, 0 ]) elektron_boxes();

translate([ (tabletop_width - digitone_keys_width()) / 2, 0, 0 ])
    digitone_keys();
